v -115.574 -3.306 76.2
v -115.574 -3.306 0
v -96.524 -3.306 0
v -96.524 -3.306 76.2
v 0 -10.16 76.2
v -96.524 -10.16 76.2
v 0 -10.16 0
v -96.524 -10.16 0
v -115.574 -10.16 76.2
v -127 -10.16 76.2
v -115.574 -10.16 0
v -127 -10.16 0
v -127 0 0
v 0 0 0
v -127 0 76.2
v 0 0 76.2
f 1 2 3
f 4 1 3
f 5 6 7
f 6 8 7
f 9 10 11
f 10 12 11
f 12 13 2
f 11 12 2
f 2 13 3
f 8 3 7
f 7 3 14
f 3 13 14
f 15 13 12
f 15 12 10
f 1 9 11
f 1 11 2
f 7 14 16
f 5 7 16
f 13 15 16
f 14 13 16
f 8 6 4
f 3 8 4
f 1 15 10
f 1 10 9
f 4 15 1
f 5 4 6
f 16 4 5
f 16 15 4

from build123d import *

# Parameters (mm, degrees)
F0_W     = 127
F0_H     = 76.2
F1_DEPTH = 10.16
F2_W     = 19.05
F2_H     = 6.0776587872
F3_DEPTH = 25.4
F4_DEPTH = 25.4
F5_DEPTH = 50.8
F6_W     = 19.05
F6_H     = 6.8539392034
F7_DEPTH = 127


with BuildPart() as f1:
    # F0 (on Front) → F1 (new body)
    with BuildSketch(Plane.XZ):
        with Locations((-63.5, 38.1)):
            Rectangle(F0_W, F0_H)
    extrude(amount=F1_DEPTH)

    # F2 (on face) → F3 (cut)
    with BuildSketch(Plane.XY.offset(76.2)):
        with Locations((-103.3981527448, -7.1211706064)):
            Rectangle(F2_W, F2_H)
    extrude(amount=-F3_DEPTH, mode=Mode.SUBTRACT)

    # F4 (cut): a face of the model
    f4_faces = [f1.faces().sort_by_distance(p)[0] for p in [
        (-103.3981527448, -7.1211706064, 50.8),
    ]]
    extrude(f4_faces, amount=-F4_DEPTH, mode=Mode.SUBTRACT)

    # F5 (add): a face of the model
    f5_faces = [f1.faces().sort_by_distance(p)[0] for p in [
        (-103.3981527448, -7.1211706064, 25.4),
    ]]
    extrude(f5_faces, amount=F5_DEPTH)

    # F6 (on face) → F7 (cut)
    with BuildSketch(Plane.XY.offset(76.2)):
        with Locations((-106.0485850334, -6.7330303983)):
            Rectangle(F6_W, F6_H)
    extrude(amount=-F7_DEPTH, mode=Mode.SUBTRACT)


solid = f1.part
